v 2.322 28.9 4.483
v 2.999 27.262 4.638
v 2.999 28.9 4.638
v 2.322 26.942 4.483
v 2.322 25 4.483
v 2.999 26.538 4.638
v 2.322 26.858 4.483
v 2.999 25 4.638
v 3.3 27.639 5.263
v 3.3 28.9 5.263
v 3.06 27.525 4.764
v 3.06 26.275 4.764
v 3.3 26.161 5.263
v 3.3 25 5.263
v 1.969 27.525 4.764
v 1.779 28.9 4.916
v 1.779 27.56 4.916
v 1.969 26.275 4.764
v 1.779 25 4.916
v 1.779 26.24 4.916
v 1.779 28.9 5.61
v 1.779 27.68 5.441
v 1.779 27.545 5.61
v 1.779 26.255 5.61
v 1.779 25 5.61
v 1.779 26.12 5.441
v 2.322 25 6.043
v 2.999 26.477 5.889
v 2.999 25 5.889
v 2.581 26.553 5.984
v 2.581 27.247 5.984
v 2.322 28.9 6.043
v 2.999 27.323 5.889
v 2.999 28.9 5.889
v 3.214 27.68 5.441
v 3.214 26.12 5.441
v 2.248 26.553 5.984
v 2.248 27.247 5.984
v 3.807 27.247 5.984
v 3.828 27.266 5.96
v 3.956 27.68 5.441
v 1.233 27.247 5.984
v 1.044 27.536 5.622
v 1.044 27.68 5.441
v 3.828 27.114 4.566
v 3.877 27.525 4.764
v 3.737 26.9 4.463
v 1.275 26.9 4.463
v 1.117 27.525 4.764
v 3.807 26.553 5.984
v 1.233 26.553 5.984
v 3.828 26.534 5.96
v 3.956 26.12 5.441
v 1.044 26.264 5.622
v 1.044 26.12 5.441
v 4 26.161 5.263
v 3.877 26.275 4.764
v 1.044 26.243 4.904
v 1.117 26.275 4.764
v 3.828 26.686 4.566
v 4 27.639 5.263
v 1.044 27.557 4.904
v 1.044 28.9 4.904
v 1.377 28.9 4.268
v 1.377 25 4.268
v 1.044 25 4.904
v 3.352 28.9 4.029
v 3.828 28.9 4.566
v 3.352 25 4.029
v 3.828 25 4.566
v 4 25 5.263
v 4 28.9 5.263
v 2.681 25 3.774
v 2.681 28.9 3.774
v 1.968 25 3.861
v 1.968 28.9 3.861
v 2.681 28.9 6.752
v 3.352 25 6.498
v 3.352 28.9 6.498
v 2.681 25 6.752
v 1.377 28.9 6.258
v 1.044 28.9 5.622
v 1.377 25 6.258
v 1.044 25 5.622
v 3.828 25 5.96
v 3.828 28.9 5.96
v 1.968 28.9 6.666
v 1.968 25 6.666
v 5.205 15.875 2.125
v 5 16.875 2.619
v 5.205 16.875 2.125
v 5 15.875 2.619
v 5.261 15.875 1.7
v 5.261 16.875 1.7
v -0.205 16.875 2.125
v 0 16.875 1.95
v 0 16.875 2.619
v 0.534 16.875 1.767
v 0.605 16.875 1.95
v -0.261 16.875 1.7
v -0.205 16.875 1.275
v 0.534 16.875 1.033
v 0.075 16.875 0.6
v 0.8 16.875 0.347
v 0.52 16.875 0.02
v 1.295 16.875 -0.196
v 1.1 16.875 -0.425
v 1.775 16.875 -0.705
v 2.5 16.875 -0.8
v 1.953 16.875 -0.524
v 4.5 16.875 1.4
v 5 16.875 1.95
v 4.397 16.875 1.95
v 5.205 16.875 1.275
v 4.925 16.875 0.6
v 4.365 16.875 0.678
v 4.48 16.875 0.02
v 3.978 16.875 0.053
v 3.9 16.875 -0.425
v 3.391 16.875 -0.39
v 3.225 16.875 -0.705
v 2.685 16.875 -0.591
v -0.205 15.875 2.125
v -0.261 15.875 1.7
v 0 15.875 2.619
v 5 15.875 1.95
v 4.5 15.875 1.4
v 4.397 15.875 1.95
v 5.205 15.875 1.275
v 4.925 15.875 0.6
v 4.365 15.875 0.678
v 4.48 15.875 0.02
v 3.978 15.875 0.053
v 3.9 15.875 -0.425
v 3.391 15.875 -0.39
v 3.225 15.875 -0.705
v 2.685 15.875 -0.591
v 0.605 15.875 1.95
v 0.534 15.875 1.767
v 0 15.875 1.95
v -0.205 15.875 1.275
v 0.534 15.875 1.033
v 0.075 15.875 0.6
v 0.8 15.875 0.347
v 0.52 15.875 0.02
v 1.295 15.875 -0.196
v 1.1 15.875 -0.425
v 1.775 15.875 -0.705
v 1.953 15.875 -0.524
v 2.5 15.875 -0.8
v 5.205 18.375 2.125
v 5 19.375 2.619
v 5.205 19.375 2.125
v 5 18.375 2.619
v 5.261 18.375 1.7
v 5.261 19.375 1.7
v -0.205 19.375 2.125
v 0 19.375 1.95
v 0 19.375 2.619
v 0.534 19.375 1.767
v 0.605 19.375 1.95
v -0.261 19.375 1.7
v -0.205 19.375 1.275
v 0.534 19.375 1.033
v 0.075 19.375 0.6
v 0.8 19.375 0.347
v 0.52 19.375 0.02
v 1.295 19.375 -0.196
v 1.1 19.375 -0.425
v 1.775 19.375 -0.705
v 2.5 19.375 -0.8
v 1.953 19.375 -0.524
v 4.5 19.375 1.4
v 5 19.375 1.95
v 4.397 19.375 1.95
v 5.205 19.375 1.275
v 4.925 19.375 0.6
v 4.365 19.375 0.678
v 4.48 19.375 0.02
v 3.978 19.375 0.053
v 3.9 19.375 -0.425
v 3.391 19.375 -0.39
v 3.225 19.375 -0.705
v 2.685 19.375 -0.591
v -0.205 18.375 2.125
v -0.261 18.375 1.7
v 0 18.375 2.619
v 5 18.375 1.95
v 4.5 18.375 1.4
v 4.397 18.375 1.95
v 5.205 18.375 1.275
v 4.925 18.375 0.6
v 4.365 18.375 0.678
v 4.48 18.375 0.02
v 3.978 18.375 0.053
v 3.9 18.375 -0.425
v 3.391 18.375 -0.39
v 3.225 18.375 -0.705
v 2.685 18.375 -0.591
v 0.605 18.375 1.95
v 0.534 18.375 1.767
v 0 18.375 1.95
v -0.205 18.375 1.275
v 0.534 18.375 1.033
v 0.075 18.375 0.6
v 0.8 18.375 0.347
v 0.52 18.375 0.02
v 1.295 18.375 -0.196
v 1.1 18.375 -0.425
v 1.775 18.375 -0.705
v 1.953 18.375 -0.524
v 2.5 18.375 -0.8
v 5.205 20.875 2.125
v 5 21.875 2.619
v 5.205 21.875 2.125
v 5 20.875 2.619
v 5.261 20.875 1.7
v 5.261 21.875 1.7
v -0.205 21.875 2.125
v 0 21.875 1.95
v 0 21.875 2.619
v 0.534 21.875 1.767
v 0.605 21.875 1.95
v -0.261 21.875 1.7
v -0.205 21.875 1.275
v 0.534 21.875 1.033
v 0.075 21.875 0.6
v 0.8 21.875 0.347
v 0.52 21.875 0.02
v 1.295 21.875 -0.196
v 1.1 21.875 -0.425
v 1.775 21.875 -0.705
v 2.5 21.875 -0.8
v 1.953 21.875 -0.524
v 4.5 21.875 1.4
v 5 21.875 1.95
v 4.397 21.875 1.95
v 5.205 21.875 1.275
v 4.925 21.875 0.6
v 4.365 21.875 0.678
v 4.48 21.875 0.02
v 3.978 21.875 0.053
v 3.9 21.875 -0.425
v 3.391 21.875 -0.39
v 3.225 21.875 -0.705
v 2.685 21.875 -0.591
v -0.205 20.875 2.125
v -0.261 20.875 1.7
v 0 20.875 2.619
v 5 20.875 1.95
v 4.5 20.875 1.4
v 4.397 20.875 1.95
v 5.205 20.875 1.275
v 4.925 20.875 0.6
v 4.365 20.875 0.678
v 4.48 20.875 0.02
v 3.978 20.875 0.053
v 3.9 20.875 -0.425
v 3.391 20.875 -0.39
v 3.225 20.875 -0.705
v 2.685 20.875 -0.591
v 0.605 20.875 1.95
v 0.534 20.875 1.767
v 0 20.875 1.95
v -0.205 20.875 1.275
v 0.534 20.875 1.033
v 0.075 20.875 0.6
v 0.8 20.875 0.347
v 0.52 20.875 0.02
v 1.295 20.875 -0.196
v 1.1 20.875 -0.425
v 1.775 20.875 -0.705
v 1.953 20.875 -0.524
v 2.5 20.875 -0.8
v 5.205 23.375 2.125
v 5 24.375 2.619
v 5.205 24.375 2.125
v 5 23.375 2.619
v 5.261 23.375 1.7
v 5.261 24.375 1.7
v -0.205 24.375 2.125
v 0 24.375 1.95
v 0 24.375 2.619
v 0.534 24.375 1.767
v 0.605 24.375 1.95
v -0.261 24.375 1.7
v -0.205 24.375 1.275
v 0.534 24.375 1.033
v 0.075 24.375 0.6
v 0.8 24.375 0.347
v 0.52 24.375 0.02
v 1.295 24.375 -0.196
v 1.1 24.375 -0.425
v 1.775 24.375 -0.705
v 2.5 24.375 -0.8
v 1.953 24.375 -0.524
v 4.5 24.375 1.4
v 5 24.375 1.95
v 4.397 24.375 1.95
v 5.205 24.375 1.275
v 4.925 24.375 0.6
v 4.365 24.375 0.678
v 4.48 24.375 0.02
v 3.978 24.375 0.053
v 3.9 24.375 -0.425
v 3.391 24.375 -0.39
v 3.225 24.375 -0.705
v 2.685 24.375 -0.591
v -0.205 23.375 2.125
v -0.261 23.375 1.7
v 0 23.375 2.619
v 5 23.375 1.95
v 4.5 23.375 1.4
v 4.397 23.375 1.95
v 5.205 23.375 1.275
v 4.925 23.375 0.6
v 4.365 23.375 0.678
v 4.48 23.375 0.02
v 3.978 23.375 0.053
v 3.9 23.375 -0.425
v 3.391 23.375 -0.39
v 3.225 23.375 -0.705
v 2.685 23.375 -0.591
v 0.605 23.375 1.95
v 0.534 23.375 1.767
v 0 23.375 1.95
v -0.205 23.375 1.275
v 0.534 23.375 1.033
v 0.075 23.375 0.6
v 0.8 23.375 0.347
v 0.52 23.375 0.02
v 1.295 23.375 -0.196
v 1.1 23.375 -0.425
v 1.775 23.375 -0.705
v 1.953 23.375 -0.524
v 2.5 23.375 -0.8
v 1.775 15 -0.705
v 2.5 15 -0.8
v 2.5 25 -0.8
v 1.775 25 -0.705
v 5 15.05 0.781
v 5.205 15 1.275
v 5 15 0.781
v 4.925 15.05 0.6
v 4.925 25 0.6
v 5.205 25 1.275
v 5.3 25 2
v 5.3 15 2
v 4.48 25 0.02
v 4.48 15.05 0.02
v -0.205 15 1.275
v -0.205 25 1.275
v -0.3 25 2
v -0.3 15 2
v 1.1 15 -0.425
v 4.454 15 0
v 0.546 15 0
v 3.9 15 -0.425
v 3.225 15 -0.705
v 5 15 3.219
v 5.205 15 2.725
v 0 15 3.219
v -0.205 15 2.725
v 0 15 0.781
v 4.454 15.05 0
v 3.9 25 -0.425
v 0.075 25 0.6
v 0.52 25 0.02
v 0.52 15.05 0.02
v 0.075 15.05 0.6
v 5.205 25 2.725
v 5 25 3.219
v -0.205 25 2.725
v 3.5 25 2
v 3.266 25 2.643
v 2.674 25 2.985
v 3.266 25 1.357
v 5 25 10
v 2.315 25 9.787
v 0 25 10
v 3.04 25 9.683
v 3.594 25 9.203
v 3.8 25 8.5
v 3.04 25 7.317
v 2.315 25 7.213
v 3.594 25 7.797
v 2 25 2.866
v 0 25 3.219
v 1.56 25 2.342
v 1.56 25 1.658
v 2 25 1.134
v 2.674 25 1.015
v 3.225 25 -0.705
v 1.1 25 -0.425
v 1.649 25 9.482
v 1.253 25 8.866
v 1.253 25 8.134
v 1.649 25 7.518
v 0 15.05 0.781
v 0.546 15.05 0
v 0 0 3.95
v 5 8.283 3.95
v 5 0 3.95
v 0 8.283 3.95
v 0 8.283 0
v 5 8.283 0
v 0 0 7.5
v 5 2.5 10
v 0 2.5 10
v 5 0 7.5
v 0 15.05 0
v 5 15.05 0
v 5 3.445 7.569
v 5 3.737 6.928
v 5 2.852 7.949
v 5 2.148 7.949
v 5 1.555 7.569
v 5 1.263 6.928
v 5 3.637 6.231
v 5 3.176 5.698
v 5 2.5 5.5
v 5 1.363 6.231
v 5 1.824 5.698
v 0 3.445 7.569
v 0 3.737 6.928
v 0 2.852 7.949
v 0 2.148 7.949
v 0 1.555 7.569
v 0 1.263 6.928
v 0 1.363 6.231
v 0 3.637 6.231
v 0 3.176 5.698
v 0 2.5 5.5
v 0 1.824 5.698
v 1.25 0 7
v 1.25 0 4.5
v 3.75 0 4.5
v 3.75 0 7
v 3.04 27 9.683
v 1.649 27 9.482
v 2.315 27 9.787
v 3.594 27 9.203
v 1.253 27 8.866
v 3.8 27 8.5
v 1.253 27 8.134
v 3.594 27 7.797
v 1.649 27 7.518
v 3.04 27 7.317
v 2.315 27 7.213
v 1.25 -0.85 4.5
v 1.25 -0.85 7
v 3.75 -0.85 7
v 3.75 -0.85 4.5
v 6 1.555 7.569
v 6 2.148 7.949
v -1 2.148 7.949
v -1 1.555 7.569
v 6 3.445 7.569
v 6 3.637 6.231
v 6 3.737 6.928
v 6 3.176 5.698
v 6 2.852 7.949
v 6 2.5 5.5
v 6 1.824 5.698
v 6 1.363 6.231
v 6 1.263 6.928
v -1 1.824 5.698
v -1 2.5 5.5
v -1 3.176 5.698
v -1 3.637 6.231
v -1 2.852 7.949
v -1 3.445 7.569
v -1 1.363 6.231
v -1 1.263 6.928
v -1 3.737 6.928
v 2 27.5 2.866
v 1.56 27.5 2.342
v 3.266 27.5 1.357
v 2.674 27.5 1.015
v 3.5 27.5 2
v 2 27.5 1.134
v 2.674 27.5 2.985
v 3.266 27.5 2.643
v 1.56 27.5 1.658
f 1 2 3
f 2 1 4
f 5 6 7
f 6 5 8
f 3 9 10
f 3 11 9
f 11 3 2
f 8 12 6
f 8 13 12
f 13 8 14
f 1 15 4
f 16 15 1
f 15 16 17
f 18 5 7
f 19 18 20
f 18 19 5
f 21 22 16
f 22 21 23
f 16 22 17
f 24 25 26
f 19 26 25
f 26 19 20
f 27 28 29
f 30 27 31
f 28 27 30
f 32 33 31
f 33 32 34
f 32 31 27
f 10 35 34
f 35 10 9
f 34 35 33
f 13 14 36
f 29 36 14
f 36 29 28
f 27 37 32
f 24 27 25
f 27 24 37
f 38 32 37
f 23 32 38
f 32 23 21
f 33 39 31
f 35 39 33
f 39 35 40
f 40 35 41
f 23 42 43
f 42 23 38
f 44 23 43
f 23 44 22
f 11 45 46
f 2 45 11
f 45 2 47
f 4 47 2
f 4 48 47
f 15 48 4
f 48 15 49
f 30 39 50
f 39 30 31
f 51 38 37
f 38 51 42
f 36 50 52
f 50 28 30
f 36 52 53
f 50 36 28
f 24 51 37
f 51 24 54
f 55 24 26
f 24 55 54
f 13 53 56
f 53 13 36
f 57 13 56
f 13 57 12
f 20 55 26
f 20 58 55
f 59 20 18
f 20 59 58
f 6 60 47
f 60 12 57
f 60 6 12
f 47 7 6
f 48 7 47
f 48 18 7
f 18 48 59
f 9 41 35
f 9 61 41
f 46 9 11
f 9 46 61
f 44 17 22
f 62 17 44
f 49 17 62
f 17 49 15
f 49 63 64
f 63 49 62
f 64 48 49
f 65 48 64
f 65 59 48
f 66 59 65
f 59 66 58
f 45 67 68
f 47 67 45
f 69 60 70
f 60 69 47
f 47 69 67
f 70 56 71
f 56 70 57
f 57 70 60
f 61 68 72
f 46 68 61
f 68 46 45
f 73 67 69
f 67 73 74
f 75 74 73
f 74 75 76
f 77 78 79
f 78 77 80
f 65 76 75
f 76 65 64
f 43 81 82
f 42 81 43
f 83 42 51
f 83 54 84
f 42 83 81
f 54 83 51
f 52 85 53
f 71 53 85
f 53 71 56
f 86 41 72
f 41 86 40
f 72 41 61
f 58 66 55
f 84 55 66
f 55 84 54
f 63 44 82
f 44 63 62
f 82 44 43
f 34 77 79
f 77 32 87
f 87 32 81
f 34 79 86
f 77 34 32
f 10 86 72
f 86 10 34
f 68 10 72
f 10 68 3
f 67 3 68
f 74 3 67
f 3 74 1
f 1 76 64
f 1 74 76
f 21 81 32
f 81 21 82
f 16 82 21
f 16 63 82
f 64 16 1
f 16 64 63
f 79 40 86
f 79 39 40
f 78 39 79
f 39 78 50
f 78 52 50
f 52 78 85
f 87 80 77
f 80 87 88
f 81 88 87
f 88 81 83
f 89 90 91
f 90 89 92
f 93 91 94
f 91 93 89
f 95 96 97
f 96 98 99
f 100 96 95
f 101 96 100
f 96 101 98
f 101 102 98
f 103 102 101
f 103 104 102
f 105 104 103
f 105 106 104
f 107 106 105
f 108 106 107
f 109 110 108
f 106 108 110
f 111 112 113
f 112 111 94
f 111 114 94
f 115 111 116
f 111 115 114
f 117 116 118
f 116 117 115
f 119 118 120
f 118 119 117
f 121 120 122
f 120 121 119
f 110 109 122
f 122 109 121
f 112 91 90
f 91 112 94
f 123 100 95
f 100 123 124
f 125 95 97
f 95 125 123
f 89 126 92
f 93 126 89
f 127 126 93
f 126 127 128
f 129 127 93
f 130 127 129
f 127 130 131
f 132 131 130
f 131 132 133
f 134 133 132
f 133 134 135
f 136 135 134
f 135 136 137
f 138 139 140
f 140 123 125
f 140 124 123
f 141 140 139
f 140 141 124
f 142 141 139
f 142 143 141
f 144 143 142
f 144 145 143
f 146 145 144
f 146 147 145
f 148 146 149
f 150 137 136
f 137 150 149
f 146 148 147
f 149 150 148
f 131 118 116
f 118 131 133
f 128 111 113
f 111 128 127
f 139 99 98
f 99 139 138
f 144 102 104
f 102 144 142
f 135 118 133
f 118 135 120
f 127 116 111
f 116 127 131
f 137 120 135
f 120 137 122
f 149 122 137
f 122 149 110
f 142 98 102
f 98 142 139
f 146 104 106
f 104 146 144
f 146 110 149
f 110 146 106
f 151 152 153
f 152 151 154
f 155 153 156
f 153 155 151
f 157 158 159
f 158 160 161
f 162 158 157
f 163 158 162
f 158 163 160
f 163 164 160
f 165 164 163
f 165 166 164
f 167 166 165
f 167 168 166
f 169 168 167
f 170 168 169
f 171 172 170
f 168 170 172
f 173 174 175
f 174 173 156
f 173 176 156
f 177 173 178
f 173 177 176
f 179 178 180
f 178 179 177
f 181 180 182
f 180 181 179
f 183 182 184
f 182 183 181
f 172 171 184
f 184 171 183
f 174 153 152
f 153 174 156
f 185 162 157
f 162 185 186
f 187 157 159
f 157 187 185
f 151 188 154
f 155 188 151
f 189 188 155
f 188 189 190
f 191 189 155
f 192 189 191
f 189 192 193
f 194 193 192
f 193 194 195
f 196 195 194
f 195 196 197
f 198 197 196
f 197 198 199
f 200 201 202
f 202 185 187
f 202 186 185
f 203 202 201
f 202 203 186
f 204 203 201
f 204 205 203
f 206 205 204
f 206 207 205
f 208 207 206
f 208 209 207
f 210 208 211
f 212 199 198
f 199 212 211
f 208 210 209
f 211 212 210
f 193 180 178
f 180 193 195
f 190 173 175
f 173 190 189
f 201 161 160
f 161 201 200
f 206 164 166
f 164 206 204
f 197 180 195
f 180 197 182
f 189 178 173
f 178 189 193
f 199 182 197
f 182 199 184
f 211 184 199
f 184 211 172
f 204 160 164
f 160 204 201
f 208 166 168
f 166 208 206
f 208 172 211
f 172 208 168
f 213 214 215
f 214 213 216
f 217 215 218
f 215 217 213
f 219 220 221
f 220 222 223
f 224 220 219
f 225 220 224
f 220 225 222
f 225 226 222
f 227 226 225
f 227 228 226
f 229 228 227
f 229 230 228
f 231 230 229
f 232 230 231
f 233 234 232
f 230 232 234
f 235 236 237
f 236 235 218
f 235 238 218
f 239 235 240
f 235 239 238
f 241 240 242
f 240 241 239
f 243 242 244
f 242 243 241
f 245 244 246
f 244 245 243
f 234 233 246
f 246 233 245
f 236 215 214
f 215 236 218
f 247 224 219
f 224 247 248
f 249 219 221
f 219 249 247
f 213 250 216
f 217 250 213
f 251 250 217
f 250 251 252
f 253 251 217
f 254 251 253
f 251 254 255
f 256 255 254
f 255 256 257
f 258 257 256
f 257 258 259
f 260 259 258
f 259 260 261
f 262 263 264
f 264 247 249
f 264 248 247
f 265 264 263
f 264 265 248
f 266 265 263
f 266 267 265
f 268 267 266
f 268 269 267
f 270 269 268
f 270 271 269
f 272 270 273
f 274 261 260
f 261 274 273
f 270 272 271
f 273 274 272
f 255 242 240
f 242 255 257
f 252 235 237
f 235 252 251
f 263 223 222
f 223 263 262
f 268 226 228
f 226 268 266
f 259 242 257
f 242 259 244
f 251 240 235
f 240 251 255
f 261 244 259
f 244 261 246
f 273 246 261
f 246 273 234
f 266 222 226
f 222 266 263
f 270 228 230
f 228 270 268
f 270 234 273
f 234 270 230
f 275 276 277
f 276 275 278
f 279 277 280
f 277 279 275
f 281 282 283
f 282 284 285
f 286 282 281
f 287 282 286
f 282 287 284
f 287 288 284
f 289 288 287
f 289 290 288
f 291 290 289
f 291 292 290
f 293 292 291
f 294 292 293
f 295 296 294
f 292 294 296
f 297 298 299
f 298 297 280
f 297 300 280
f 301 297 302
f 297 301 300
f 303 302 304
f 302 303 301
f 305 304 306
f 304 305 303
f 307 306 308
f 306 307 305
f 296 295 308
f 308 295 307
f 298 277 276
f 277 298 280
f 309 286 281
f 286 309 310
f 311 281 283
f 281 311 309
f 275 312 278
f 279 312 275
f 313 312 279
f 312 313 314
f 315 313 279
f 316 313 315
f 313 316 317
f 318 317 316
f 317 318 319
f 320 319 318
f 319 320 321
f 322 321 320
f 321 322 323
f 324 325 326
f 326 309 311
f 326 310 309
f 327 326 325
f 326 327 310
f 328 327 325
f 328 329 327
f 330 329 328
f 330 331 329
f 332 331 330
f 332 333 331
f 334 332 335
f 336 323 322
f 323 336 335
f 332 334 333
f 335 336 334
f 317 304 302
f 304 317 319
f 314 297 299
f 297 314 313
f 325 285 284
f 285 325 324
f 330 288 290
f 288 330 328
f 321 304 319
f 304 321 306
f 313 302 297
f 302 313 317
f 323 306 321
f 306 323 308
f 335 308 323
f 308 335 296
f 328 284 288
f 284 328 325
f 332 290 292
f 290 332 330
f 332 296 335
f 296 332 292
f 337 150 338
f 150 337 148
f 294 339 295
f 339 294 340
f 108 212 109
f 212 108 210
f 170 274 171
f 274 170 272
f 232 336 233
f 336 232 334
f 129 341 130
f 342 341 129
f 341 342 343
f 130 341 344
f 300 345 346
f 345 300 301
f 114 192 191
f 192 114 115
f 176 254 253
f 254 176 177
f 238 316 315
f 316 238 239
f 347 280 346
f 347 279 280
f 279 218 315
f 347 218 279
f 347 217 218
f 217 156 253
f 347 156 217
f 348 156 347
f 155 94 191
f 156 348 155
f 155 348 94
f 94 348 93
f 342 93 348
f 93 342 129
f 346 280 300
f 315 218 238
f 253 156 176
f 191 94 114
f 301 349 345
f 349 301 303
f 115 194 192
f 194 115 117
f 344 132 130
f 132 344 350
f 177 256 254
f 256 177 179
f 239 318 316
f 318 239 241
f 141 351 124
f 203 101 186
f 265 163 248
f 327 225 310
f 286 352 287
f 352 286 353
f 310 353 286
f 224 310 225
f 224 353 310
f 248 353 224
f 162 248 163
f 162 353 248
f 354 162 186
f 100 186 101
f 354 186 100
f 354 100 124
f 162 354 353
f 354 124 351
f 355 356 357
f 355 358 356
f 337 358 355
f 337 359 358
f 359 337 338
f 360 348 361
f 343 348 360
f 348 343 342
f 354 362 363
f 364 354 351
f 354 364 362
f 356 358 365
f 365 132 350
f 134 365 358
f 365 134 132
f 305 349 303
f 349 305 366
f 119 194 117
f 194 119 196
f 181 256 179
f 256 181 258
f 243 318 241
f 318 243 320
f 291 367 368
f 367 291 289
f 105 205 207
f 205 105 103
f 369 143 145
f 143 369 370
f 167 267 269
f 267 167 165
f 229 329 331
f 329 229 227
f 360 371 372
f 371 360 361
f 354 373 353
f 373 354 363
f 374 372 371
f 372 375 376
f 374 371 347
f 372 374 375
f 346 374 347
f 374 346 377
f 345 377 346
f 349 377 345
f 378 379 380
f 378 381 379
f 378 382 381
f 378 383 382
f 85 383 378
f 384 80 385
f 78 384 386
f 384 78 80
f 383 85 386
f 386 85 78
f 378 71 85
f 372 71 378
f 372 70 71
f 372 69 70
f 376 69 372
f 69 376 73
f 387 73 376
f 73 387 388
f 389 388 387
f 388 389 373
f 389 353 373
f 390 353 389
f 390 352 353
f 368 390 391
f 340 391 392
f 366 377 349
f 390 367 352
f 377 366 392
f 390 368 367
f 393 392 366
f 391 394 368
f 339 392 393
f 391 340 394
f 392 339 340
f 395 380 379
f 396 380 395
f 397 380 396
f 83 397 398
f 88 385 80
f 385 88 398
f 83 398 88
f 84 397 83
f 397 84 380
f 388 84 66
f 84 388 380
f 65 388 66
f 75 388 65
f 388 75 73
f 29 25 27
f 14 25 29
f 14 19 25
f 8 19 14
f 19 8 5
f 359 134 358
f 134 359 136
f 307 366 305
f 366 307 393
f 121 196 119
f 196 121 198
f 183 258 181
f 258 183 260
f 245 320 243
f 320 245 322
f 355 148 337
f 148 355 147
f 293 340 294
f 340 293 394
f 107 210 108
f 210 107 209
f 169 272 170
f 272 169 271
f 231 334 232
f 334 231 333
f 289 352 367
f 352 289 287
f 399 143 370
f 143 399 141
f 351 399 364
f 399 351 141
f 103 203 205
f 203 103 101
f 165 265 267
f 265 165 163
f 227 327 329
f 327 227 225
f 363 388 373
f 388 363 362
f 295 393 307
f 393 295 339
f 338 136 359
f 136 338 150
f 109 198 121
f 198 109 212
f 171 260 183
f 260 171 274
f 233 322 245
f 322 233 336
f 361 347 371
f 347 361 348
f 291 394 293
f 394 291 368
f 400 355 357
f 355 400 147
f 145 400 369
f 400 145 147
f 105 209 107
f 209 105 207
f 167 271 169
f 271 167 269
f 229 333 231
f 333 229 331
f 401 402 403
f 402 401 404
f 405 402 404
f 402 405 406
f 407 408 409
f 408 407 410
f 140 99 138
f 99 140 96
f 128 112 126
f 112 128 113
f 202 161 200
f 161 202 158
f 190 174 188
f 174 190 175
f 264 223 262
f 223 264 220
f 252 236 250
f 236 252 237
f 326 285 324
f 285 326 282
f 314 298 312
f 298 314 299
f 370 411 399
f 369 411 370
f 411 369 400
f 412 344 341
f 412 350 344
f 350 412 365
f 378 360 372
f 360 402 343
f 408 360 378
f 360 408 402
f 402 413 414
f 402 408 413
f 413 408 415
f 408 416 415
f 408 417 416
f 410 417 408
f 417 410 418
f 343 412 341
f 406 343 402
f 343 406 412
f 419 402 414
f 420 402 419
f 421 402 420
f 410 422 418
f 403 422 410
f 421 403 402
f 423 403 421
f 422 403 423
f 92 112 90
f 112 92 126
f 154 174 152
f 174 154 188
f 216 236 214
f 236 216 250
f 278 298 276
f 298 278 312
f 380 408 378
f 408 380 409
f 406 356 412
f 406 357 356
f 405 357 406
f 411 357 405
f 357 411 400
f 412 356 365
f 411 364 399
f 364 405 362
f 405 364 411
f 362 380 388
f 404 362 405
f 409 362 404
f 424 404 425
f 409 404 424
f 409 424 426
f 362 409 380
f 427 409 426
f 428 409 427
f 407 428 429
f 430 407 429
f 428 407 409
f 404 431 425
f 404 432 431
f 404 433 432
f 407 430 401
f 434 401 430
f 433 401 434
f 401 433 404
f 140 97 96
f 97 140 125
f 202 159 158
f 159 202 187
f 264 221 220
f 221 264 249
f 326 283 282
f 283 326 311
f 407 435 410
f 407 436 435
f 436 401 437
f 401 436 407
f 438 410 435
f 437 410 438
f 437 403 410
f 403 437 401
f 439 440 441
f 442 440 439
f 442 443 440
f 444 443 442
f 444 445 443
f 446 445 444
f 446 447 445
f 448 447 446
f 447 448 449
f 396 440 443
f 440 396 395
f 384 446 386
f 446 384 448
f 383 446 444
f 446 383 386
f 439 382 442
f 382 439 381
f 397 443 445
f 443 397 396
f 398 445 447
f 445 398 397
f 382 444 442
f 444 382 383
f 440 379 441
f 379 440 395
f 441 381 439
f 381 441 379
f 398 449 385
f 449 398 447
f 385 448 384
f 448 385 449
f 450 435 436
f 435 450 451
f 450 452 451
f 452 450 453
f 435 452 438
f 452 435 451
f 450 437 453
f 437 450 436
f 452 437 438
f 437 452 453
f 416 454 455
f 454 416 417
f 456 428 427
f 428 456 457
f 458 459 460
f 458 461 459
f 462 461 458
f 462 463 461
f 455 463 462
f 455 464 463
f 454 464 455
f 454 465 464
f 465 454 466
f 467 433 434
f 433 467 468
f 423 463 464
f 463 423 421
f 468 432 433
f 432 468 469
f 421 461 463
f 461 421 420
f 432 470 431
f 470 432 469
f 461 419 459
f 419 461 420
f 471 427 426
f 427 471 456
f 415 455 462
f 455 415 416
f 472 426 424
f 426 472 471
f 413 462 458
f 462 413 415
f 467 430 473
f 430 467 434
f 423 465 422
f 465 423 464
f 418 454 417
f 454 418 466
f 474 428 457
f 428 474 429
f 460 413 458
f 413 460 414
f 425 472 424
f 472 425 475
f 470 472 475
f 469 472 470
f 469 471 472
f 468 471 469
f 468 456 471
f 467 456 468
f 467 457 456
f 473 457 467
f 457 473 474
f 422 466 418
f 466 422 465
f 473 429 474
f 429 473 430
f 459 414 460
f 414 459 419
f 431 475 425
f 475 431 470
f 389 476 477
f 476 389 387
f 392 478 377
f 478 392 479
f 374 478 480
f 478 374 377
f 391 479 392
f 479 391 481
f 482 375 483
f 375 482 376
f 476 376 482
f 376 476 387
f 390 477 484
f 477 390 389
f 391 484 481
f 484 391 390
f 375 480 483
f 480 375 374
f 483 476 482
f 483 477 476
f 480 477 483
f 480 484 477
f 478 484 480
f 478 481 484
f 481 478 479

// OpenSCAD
$fa=0.5;
$fs=0.75;


gun_w = 5;
gun_h = 2*gun_w;
gun_l = 5*gun_w;
wide_w = 7;
button_w = gun_w*0.5;
cspring_r = gun_w*0.2;
fgrip_r = (gun_w/2) + 0.3;
barrel_r = (cspring_r*1.5);

module bolt_gun()
{
	//laser sight
    translate([gun_w/2, gun_l - 1, gun_h - 1.5]) rotate([-90,0,0]) 
        cylinder(3, cspring_r+0.3, cspring_r+0.3);
    //button
    translate([gun_w/4, 0, gun_w*.9]) rotate([90,0,0]) 
        cube([button_w, button_w, .85]);
    //knob
	translate([-1, gun_w*.5, gun_w*1.35]) rotate([0,90,0]) 
	        cylinder(wide_w, button_w/2, button_w/2);
    //compression spring
    translate([gun_w/2, gun_l-(gun_l*0.4), gun_h*0.2]) rotate([-90,0,0])
        cylinder(gun_l/2, cspring_r, cspring_r);
    //front grip
    difference(){
        translate([gun_w/2, gun_l-(gun_l*0.4), gun_h*0.2]) rotate([-90,0,0])
            cylinder(gun_l/2.5, fgrip_r, fgrip_r);
        union(){
            translate([0, gun_l-(gun_l*0.325), 0]) grip_groove();
            translate([0, gun_l-(gun_l*0.225), 0]) grip_groove();
            translate([0, gun_l-(gun_l*0.125), 0]) grip_groove();
            translate([0, gun_l-(gun_l*0.025), 0]) grip_groove();
        }
    }
	difference()
	{
		cube([gun_w, gun_l, gun_h]);
	    union(){
		    //trigger space
		    translate([-0.05,-0.05,-0.05]) 
		        cube([gun_w + 0.1, gun_l/3, gun_h*0.4]);
	        //hammer lever area
	        translate([-0.05,0,gun_w*1.5]) rotate([45,0,0]) 
	            cube([gun_w + 0.1, gun_w + 0.2, gun_w + 0.2]);
            //frontal grip
            translate([-0.05, gun_l-(gun_l*0.4)+0.05, -0.05]) 
                cube([gun_w+0.1, gun_l*0.4, gun_h*0.2]);
        }
		
	}
}
module barrel(){
    //barrel
    difference(){
        rotate([-90,0,0])
        cylinder(4, barrel_r, barrel_r);
    translate([0,2,0]) union(){
        translate([0,-3,0]) rotate([-90,0,0]) cylinder(6, 0.8, 0.8);
        translate([-2.5,0,0]) rotate([0,90,0]) cylinder(5,0.8, 0.8);
    }
    }
}
translate([gun_w/2, gun_l - 0.1, gun_h/1.9]) barrel();
module grip_groove(){
    translate([gun_w/2, 0, fgrip_r/2]) rotate([90,0,0]) difference(){
        cylinder(1, fgrip_r, fgrip_r);
        translate([0,0,-0.1]) cylinder(1.2, gun_w*0.4, gun_w*0.4);
    }
}
//grip_groove();
bolt_gun();
